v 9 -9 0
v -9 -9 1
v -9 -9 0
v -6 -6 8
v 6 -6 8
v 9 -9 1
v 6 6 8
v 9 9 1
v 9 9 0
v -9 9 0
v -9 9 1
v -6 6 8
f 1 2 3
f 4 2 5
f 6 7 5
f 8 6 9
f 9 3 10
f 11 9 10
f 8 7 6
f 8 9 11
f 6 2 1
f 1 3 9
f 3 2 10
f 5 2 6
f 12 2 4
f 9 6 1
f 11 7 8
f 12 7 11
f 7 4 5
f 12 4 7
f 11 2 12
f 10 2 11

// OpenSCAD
module keycap() {
    hull()
    {
        linear_extrude(height=1)
            difference() {
            square(size=18, center=true);
            square(size=16, center=true);
        }
        translate([0,0,7])
            linear_extrude(height=1)
            square(size=12, center=true);
    }
}

keycap();
